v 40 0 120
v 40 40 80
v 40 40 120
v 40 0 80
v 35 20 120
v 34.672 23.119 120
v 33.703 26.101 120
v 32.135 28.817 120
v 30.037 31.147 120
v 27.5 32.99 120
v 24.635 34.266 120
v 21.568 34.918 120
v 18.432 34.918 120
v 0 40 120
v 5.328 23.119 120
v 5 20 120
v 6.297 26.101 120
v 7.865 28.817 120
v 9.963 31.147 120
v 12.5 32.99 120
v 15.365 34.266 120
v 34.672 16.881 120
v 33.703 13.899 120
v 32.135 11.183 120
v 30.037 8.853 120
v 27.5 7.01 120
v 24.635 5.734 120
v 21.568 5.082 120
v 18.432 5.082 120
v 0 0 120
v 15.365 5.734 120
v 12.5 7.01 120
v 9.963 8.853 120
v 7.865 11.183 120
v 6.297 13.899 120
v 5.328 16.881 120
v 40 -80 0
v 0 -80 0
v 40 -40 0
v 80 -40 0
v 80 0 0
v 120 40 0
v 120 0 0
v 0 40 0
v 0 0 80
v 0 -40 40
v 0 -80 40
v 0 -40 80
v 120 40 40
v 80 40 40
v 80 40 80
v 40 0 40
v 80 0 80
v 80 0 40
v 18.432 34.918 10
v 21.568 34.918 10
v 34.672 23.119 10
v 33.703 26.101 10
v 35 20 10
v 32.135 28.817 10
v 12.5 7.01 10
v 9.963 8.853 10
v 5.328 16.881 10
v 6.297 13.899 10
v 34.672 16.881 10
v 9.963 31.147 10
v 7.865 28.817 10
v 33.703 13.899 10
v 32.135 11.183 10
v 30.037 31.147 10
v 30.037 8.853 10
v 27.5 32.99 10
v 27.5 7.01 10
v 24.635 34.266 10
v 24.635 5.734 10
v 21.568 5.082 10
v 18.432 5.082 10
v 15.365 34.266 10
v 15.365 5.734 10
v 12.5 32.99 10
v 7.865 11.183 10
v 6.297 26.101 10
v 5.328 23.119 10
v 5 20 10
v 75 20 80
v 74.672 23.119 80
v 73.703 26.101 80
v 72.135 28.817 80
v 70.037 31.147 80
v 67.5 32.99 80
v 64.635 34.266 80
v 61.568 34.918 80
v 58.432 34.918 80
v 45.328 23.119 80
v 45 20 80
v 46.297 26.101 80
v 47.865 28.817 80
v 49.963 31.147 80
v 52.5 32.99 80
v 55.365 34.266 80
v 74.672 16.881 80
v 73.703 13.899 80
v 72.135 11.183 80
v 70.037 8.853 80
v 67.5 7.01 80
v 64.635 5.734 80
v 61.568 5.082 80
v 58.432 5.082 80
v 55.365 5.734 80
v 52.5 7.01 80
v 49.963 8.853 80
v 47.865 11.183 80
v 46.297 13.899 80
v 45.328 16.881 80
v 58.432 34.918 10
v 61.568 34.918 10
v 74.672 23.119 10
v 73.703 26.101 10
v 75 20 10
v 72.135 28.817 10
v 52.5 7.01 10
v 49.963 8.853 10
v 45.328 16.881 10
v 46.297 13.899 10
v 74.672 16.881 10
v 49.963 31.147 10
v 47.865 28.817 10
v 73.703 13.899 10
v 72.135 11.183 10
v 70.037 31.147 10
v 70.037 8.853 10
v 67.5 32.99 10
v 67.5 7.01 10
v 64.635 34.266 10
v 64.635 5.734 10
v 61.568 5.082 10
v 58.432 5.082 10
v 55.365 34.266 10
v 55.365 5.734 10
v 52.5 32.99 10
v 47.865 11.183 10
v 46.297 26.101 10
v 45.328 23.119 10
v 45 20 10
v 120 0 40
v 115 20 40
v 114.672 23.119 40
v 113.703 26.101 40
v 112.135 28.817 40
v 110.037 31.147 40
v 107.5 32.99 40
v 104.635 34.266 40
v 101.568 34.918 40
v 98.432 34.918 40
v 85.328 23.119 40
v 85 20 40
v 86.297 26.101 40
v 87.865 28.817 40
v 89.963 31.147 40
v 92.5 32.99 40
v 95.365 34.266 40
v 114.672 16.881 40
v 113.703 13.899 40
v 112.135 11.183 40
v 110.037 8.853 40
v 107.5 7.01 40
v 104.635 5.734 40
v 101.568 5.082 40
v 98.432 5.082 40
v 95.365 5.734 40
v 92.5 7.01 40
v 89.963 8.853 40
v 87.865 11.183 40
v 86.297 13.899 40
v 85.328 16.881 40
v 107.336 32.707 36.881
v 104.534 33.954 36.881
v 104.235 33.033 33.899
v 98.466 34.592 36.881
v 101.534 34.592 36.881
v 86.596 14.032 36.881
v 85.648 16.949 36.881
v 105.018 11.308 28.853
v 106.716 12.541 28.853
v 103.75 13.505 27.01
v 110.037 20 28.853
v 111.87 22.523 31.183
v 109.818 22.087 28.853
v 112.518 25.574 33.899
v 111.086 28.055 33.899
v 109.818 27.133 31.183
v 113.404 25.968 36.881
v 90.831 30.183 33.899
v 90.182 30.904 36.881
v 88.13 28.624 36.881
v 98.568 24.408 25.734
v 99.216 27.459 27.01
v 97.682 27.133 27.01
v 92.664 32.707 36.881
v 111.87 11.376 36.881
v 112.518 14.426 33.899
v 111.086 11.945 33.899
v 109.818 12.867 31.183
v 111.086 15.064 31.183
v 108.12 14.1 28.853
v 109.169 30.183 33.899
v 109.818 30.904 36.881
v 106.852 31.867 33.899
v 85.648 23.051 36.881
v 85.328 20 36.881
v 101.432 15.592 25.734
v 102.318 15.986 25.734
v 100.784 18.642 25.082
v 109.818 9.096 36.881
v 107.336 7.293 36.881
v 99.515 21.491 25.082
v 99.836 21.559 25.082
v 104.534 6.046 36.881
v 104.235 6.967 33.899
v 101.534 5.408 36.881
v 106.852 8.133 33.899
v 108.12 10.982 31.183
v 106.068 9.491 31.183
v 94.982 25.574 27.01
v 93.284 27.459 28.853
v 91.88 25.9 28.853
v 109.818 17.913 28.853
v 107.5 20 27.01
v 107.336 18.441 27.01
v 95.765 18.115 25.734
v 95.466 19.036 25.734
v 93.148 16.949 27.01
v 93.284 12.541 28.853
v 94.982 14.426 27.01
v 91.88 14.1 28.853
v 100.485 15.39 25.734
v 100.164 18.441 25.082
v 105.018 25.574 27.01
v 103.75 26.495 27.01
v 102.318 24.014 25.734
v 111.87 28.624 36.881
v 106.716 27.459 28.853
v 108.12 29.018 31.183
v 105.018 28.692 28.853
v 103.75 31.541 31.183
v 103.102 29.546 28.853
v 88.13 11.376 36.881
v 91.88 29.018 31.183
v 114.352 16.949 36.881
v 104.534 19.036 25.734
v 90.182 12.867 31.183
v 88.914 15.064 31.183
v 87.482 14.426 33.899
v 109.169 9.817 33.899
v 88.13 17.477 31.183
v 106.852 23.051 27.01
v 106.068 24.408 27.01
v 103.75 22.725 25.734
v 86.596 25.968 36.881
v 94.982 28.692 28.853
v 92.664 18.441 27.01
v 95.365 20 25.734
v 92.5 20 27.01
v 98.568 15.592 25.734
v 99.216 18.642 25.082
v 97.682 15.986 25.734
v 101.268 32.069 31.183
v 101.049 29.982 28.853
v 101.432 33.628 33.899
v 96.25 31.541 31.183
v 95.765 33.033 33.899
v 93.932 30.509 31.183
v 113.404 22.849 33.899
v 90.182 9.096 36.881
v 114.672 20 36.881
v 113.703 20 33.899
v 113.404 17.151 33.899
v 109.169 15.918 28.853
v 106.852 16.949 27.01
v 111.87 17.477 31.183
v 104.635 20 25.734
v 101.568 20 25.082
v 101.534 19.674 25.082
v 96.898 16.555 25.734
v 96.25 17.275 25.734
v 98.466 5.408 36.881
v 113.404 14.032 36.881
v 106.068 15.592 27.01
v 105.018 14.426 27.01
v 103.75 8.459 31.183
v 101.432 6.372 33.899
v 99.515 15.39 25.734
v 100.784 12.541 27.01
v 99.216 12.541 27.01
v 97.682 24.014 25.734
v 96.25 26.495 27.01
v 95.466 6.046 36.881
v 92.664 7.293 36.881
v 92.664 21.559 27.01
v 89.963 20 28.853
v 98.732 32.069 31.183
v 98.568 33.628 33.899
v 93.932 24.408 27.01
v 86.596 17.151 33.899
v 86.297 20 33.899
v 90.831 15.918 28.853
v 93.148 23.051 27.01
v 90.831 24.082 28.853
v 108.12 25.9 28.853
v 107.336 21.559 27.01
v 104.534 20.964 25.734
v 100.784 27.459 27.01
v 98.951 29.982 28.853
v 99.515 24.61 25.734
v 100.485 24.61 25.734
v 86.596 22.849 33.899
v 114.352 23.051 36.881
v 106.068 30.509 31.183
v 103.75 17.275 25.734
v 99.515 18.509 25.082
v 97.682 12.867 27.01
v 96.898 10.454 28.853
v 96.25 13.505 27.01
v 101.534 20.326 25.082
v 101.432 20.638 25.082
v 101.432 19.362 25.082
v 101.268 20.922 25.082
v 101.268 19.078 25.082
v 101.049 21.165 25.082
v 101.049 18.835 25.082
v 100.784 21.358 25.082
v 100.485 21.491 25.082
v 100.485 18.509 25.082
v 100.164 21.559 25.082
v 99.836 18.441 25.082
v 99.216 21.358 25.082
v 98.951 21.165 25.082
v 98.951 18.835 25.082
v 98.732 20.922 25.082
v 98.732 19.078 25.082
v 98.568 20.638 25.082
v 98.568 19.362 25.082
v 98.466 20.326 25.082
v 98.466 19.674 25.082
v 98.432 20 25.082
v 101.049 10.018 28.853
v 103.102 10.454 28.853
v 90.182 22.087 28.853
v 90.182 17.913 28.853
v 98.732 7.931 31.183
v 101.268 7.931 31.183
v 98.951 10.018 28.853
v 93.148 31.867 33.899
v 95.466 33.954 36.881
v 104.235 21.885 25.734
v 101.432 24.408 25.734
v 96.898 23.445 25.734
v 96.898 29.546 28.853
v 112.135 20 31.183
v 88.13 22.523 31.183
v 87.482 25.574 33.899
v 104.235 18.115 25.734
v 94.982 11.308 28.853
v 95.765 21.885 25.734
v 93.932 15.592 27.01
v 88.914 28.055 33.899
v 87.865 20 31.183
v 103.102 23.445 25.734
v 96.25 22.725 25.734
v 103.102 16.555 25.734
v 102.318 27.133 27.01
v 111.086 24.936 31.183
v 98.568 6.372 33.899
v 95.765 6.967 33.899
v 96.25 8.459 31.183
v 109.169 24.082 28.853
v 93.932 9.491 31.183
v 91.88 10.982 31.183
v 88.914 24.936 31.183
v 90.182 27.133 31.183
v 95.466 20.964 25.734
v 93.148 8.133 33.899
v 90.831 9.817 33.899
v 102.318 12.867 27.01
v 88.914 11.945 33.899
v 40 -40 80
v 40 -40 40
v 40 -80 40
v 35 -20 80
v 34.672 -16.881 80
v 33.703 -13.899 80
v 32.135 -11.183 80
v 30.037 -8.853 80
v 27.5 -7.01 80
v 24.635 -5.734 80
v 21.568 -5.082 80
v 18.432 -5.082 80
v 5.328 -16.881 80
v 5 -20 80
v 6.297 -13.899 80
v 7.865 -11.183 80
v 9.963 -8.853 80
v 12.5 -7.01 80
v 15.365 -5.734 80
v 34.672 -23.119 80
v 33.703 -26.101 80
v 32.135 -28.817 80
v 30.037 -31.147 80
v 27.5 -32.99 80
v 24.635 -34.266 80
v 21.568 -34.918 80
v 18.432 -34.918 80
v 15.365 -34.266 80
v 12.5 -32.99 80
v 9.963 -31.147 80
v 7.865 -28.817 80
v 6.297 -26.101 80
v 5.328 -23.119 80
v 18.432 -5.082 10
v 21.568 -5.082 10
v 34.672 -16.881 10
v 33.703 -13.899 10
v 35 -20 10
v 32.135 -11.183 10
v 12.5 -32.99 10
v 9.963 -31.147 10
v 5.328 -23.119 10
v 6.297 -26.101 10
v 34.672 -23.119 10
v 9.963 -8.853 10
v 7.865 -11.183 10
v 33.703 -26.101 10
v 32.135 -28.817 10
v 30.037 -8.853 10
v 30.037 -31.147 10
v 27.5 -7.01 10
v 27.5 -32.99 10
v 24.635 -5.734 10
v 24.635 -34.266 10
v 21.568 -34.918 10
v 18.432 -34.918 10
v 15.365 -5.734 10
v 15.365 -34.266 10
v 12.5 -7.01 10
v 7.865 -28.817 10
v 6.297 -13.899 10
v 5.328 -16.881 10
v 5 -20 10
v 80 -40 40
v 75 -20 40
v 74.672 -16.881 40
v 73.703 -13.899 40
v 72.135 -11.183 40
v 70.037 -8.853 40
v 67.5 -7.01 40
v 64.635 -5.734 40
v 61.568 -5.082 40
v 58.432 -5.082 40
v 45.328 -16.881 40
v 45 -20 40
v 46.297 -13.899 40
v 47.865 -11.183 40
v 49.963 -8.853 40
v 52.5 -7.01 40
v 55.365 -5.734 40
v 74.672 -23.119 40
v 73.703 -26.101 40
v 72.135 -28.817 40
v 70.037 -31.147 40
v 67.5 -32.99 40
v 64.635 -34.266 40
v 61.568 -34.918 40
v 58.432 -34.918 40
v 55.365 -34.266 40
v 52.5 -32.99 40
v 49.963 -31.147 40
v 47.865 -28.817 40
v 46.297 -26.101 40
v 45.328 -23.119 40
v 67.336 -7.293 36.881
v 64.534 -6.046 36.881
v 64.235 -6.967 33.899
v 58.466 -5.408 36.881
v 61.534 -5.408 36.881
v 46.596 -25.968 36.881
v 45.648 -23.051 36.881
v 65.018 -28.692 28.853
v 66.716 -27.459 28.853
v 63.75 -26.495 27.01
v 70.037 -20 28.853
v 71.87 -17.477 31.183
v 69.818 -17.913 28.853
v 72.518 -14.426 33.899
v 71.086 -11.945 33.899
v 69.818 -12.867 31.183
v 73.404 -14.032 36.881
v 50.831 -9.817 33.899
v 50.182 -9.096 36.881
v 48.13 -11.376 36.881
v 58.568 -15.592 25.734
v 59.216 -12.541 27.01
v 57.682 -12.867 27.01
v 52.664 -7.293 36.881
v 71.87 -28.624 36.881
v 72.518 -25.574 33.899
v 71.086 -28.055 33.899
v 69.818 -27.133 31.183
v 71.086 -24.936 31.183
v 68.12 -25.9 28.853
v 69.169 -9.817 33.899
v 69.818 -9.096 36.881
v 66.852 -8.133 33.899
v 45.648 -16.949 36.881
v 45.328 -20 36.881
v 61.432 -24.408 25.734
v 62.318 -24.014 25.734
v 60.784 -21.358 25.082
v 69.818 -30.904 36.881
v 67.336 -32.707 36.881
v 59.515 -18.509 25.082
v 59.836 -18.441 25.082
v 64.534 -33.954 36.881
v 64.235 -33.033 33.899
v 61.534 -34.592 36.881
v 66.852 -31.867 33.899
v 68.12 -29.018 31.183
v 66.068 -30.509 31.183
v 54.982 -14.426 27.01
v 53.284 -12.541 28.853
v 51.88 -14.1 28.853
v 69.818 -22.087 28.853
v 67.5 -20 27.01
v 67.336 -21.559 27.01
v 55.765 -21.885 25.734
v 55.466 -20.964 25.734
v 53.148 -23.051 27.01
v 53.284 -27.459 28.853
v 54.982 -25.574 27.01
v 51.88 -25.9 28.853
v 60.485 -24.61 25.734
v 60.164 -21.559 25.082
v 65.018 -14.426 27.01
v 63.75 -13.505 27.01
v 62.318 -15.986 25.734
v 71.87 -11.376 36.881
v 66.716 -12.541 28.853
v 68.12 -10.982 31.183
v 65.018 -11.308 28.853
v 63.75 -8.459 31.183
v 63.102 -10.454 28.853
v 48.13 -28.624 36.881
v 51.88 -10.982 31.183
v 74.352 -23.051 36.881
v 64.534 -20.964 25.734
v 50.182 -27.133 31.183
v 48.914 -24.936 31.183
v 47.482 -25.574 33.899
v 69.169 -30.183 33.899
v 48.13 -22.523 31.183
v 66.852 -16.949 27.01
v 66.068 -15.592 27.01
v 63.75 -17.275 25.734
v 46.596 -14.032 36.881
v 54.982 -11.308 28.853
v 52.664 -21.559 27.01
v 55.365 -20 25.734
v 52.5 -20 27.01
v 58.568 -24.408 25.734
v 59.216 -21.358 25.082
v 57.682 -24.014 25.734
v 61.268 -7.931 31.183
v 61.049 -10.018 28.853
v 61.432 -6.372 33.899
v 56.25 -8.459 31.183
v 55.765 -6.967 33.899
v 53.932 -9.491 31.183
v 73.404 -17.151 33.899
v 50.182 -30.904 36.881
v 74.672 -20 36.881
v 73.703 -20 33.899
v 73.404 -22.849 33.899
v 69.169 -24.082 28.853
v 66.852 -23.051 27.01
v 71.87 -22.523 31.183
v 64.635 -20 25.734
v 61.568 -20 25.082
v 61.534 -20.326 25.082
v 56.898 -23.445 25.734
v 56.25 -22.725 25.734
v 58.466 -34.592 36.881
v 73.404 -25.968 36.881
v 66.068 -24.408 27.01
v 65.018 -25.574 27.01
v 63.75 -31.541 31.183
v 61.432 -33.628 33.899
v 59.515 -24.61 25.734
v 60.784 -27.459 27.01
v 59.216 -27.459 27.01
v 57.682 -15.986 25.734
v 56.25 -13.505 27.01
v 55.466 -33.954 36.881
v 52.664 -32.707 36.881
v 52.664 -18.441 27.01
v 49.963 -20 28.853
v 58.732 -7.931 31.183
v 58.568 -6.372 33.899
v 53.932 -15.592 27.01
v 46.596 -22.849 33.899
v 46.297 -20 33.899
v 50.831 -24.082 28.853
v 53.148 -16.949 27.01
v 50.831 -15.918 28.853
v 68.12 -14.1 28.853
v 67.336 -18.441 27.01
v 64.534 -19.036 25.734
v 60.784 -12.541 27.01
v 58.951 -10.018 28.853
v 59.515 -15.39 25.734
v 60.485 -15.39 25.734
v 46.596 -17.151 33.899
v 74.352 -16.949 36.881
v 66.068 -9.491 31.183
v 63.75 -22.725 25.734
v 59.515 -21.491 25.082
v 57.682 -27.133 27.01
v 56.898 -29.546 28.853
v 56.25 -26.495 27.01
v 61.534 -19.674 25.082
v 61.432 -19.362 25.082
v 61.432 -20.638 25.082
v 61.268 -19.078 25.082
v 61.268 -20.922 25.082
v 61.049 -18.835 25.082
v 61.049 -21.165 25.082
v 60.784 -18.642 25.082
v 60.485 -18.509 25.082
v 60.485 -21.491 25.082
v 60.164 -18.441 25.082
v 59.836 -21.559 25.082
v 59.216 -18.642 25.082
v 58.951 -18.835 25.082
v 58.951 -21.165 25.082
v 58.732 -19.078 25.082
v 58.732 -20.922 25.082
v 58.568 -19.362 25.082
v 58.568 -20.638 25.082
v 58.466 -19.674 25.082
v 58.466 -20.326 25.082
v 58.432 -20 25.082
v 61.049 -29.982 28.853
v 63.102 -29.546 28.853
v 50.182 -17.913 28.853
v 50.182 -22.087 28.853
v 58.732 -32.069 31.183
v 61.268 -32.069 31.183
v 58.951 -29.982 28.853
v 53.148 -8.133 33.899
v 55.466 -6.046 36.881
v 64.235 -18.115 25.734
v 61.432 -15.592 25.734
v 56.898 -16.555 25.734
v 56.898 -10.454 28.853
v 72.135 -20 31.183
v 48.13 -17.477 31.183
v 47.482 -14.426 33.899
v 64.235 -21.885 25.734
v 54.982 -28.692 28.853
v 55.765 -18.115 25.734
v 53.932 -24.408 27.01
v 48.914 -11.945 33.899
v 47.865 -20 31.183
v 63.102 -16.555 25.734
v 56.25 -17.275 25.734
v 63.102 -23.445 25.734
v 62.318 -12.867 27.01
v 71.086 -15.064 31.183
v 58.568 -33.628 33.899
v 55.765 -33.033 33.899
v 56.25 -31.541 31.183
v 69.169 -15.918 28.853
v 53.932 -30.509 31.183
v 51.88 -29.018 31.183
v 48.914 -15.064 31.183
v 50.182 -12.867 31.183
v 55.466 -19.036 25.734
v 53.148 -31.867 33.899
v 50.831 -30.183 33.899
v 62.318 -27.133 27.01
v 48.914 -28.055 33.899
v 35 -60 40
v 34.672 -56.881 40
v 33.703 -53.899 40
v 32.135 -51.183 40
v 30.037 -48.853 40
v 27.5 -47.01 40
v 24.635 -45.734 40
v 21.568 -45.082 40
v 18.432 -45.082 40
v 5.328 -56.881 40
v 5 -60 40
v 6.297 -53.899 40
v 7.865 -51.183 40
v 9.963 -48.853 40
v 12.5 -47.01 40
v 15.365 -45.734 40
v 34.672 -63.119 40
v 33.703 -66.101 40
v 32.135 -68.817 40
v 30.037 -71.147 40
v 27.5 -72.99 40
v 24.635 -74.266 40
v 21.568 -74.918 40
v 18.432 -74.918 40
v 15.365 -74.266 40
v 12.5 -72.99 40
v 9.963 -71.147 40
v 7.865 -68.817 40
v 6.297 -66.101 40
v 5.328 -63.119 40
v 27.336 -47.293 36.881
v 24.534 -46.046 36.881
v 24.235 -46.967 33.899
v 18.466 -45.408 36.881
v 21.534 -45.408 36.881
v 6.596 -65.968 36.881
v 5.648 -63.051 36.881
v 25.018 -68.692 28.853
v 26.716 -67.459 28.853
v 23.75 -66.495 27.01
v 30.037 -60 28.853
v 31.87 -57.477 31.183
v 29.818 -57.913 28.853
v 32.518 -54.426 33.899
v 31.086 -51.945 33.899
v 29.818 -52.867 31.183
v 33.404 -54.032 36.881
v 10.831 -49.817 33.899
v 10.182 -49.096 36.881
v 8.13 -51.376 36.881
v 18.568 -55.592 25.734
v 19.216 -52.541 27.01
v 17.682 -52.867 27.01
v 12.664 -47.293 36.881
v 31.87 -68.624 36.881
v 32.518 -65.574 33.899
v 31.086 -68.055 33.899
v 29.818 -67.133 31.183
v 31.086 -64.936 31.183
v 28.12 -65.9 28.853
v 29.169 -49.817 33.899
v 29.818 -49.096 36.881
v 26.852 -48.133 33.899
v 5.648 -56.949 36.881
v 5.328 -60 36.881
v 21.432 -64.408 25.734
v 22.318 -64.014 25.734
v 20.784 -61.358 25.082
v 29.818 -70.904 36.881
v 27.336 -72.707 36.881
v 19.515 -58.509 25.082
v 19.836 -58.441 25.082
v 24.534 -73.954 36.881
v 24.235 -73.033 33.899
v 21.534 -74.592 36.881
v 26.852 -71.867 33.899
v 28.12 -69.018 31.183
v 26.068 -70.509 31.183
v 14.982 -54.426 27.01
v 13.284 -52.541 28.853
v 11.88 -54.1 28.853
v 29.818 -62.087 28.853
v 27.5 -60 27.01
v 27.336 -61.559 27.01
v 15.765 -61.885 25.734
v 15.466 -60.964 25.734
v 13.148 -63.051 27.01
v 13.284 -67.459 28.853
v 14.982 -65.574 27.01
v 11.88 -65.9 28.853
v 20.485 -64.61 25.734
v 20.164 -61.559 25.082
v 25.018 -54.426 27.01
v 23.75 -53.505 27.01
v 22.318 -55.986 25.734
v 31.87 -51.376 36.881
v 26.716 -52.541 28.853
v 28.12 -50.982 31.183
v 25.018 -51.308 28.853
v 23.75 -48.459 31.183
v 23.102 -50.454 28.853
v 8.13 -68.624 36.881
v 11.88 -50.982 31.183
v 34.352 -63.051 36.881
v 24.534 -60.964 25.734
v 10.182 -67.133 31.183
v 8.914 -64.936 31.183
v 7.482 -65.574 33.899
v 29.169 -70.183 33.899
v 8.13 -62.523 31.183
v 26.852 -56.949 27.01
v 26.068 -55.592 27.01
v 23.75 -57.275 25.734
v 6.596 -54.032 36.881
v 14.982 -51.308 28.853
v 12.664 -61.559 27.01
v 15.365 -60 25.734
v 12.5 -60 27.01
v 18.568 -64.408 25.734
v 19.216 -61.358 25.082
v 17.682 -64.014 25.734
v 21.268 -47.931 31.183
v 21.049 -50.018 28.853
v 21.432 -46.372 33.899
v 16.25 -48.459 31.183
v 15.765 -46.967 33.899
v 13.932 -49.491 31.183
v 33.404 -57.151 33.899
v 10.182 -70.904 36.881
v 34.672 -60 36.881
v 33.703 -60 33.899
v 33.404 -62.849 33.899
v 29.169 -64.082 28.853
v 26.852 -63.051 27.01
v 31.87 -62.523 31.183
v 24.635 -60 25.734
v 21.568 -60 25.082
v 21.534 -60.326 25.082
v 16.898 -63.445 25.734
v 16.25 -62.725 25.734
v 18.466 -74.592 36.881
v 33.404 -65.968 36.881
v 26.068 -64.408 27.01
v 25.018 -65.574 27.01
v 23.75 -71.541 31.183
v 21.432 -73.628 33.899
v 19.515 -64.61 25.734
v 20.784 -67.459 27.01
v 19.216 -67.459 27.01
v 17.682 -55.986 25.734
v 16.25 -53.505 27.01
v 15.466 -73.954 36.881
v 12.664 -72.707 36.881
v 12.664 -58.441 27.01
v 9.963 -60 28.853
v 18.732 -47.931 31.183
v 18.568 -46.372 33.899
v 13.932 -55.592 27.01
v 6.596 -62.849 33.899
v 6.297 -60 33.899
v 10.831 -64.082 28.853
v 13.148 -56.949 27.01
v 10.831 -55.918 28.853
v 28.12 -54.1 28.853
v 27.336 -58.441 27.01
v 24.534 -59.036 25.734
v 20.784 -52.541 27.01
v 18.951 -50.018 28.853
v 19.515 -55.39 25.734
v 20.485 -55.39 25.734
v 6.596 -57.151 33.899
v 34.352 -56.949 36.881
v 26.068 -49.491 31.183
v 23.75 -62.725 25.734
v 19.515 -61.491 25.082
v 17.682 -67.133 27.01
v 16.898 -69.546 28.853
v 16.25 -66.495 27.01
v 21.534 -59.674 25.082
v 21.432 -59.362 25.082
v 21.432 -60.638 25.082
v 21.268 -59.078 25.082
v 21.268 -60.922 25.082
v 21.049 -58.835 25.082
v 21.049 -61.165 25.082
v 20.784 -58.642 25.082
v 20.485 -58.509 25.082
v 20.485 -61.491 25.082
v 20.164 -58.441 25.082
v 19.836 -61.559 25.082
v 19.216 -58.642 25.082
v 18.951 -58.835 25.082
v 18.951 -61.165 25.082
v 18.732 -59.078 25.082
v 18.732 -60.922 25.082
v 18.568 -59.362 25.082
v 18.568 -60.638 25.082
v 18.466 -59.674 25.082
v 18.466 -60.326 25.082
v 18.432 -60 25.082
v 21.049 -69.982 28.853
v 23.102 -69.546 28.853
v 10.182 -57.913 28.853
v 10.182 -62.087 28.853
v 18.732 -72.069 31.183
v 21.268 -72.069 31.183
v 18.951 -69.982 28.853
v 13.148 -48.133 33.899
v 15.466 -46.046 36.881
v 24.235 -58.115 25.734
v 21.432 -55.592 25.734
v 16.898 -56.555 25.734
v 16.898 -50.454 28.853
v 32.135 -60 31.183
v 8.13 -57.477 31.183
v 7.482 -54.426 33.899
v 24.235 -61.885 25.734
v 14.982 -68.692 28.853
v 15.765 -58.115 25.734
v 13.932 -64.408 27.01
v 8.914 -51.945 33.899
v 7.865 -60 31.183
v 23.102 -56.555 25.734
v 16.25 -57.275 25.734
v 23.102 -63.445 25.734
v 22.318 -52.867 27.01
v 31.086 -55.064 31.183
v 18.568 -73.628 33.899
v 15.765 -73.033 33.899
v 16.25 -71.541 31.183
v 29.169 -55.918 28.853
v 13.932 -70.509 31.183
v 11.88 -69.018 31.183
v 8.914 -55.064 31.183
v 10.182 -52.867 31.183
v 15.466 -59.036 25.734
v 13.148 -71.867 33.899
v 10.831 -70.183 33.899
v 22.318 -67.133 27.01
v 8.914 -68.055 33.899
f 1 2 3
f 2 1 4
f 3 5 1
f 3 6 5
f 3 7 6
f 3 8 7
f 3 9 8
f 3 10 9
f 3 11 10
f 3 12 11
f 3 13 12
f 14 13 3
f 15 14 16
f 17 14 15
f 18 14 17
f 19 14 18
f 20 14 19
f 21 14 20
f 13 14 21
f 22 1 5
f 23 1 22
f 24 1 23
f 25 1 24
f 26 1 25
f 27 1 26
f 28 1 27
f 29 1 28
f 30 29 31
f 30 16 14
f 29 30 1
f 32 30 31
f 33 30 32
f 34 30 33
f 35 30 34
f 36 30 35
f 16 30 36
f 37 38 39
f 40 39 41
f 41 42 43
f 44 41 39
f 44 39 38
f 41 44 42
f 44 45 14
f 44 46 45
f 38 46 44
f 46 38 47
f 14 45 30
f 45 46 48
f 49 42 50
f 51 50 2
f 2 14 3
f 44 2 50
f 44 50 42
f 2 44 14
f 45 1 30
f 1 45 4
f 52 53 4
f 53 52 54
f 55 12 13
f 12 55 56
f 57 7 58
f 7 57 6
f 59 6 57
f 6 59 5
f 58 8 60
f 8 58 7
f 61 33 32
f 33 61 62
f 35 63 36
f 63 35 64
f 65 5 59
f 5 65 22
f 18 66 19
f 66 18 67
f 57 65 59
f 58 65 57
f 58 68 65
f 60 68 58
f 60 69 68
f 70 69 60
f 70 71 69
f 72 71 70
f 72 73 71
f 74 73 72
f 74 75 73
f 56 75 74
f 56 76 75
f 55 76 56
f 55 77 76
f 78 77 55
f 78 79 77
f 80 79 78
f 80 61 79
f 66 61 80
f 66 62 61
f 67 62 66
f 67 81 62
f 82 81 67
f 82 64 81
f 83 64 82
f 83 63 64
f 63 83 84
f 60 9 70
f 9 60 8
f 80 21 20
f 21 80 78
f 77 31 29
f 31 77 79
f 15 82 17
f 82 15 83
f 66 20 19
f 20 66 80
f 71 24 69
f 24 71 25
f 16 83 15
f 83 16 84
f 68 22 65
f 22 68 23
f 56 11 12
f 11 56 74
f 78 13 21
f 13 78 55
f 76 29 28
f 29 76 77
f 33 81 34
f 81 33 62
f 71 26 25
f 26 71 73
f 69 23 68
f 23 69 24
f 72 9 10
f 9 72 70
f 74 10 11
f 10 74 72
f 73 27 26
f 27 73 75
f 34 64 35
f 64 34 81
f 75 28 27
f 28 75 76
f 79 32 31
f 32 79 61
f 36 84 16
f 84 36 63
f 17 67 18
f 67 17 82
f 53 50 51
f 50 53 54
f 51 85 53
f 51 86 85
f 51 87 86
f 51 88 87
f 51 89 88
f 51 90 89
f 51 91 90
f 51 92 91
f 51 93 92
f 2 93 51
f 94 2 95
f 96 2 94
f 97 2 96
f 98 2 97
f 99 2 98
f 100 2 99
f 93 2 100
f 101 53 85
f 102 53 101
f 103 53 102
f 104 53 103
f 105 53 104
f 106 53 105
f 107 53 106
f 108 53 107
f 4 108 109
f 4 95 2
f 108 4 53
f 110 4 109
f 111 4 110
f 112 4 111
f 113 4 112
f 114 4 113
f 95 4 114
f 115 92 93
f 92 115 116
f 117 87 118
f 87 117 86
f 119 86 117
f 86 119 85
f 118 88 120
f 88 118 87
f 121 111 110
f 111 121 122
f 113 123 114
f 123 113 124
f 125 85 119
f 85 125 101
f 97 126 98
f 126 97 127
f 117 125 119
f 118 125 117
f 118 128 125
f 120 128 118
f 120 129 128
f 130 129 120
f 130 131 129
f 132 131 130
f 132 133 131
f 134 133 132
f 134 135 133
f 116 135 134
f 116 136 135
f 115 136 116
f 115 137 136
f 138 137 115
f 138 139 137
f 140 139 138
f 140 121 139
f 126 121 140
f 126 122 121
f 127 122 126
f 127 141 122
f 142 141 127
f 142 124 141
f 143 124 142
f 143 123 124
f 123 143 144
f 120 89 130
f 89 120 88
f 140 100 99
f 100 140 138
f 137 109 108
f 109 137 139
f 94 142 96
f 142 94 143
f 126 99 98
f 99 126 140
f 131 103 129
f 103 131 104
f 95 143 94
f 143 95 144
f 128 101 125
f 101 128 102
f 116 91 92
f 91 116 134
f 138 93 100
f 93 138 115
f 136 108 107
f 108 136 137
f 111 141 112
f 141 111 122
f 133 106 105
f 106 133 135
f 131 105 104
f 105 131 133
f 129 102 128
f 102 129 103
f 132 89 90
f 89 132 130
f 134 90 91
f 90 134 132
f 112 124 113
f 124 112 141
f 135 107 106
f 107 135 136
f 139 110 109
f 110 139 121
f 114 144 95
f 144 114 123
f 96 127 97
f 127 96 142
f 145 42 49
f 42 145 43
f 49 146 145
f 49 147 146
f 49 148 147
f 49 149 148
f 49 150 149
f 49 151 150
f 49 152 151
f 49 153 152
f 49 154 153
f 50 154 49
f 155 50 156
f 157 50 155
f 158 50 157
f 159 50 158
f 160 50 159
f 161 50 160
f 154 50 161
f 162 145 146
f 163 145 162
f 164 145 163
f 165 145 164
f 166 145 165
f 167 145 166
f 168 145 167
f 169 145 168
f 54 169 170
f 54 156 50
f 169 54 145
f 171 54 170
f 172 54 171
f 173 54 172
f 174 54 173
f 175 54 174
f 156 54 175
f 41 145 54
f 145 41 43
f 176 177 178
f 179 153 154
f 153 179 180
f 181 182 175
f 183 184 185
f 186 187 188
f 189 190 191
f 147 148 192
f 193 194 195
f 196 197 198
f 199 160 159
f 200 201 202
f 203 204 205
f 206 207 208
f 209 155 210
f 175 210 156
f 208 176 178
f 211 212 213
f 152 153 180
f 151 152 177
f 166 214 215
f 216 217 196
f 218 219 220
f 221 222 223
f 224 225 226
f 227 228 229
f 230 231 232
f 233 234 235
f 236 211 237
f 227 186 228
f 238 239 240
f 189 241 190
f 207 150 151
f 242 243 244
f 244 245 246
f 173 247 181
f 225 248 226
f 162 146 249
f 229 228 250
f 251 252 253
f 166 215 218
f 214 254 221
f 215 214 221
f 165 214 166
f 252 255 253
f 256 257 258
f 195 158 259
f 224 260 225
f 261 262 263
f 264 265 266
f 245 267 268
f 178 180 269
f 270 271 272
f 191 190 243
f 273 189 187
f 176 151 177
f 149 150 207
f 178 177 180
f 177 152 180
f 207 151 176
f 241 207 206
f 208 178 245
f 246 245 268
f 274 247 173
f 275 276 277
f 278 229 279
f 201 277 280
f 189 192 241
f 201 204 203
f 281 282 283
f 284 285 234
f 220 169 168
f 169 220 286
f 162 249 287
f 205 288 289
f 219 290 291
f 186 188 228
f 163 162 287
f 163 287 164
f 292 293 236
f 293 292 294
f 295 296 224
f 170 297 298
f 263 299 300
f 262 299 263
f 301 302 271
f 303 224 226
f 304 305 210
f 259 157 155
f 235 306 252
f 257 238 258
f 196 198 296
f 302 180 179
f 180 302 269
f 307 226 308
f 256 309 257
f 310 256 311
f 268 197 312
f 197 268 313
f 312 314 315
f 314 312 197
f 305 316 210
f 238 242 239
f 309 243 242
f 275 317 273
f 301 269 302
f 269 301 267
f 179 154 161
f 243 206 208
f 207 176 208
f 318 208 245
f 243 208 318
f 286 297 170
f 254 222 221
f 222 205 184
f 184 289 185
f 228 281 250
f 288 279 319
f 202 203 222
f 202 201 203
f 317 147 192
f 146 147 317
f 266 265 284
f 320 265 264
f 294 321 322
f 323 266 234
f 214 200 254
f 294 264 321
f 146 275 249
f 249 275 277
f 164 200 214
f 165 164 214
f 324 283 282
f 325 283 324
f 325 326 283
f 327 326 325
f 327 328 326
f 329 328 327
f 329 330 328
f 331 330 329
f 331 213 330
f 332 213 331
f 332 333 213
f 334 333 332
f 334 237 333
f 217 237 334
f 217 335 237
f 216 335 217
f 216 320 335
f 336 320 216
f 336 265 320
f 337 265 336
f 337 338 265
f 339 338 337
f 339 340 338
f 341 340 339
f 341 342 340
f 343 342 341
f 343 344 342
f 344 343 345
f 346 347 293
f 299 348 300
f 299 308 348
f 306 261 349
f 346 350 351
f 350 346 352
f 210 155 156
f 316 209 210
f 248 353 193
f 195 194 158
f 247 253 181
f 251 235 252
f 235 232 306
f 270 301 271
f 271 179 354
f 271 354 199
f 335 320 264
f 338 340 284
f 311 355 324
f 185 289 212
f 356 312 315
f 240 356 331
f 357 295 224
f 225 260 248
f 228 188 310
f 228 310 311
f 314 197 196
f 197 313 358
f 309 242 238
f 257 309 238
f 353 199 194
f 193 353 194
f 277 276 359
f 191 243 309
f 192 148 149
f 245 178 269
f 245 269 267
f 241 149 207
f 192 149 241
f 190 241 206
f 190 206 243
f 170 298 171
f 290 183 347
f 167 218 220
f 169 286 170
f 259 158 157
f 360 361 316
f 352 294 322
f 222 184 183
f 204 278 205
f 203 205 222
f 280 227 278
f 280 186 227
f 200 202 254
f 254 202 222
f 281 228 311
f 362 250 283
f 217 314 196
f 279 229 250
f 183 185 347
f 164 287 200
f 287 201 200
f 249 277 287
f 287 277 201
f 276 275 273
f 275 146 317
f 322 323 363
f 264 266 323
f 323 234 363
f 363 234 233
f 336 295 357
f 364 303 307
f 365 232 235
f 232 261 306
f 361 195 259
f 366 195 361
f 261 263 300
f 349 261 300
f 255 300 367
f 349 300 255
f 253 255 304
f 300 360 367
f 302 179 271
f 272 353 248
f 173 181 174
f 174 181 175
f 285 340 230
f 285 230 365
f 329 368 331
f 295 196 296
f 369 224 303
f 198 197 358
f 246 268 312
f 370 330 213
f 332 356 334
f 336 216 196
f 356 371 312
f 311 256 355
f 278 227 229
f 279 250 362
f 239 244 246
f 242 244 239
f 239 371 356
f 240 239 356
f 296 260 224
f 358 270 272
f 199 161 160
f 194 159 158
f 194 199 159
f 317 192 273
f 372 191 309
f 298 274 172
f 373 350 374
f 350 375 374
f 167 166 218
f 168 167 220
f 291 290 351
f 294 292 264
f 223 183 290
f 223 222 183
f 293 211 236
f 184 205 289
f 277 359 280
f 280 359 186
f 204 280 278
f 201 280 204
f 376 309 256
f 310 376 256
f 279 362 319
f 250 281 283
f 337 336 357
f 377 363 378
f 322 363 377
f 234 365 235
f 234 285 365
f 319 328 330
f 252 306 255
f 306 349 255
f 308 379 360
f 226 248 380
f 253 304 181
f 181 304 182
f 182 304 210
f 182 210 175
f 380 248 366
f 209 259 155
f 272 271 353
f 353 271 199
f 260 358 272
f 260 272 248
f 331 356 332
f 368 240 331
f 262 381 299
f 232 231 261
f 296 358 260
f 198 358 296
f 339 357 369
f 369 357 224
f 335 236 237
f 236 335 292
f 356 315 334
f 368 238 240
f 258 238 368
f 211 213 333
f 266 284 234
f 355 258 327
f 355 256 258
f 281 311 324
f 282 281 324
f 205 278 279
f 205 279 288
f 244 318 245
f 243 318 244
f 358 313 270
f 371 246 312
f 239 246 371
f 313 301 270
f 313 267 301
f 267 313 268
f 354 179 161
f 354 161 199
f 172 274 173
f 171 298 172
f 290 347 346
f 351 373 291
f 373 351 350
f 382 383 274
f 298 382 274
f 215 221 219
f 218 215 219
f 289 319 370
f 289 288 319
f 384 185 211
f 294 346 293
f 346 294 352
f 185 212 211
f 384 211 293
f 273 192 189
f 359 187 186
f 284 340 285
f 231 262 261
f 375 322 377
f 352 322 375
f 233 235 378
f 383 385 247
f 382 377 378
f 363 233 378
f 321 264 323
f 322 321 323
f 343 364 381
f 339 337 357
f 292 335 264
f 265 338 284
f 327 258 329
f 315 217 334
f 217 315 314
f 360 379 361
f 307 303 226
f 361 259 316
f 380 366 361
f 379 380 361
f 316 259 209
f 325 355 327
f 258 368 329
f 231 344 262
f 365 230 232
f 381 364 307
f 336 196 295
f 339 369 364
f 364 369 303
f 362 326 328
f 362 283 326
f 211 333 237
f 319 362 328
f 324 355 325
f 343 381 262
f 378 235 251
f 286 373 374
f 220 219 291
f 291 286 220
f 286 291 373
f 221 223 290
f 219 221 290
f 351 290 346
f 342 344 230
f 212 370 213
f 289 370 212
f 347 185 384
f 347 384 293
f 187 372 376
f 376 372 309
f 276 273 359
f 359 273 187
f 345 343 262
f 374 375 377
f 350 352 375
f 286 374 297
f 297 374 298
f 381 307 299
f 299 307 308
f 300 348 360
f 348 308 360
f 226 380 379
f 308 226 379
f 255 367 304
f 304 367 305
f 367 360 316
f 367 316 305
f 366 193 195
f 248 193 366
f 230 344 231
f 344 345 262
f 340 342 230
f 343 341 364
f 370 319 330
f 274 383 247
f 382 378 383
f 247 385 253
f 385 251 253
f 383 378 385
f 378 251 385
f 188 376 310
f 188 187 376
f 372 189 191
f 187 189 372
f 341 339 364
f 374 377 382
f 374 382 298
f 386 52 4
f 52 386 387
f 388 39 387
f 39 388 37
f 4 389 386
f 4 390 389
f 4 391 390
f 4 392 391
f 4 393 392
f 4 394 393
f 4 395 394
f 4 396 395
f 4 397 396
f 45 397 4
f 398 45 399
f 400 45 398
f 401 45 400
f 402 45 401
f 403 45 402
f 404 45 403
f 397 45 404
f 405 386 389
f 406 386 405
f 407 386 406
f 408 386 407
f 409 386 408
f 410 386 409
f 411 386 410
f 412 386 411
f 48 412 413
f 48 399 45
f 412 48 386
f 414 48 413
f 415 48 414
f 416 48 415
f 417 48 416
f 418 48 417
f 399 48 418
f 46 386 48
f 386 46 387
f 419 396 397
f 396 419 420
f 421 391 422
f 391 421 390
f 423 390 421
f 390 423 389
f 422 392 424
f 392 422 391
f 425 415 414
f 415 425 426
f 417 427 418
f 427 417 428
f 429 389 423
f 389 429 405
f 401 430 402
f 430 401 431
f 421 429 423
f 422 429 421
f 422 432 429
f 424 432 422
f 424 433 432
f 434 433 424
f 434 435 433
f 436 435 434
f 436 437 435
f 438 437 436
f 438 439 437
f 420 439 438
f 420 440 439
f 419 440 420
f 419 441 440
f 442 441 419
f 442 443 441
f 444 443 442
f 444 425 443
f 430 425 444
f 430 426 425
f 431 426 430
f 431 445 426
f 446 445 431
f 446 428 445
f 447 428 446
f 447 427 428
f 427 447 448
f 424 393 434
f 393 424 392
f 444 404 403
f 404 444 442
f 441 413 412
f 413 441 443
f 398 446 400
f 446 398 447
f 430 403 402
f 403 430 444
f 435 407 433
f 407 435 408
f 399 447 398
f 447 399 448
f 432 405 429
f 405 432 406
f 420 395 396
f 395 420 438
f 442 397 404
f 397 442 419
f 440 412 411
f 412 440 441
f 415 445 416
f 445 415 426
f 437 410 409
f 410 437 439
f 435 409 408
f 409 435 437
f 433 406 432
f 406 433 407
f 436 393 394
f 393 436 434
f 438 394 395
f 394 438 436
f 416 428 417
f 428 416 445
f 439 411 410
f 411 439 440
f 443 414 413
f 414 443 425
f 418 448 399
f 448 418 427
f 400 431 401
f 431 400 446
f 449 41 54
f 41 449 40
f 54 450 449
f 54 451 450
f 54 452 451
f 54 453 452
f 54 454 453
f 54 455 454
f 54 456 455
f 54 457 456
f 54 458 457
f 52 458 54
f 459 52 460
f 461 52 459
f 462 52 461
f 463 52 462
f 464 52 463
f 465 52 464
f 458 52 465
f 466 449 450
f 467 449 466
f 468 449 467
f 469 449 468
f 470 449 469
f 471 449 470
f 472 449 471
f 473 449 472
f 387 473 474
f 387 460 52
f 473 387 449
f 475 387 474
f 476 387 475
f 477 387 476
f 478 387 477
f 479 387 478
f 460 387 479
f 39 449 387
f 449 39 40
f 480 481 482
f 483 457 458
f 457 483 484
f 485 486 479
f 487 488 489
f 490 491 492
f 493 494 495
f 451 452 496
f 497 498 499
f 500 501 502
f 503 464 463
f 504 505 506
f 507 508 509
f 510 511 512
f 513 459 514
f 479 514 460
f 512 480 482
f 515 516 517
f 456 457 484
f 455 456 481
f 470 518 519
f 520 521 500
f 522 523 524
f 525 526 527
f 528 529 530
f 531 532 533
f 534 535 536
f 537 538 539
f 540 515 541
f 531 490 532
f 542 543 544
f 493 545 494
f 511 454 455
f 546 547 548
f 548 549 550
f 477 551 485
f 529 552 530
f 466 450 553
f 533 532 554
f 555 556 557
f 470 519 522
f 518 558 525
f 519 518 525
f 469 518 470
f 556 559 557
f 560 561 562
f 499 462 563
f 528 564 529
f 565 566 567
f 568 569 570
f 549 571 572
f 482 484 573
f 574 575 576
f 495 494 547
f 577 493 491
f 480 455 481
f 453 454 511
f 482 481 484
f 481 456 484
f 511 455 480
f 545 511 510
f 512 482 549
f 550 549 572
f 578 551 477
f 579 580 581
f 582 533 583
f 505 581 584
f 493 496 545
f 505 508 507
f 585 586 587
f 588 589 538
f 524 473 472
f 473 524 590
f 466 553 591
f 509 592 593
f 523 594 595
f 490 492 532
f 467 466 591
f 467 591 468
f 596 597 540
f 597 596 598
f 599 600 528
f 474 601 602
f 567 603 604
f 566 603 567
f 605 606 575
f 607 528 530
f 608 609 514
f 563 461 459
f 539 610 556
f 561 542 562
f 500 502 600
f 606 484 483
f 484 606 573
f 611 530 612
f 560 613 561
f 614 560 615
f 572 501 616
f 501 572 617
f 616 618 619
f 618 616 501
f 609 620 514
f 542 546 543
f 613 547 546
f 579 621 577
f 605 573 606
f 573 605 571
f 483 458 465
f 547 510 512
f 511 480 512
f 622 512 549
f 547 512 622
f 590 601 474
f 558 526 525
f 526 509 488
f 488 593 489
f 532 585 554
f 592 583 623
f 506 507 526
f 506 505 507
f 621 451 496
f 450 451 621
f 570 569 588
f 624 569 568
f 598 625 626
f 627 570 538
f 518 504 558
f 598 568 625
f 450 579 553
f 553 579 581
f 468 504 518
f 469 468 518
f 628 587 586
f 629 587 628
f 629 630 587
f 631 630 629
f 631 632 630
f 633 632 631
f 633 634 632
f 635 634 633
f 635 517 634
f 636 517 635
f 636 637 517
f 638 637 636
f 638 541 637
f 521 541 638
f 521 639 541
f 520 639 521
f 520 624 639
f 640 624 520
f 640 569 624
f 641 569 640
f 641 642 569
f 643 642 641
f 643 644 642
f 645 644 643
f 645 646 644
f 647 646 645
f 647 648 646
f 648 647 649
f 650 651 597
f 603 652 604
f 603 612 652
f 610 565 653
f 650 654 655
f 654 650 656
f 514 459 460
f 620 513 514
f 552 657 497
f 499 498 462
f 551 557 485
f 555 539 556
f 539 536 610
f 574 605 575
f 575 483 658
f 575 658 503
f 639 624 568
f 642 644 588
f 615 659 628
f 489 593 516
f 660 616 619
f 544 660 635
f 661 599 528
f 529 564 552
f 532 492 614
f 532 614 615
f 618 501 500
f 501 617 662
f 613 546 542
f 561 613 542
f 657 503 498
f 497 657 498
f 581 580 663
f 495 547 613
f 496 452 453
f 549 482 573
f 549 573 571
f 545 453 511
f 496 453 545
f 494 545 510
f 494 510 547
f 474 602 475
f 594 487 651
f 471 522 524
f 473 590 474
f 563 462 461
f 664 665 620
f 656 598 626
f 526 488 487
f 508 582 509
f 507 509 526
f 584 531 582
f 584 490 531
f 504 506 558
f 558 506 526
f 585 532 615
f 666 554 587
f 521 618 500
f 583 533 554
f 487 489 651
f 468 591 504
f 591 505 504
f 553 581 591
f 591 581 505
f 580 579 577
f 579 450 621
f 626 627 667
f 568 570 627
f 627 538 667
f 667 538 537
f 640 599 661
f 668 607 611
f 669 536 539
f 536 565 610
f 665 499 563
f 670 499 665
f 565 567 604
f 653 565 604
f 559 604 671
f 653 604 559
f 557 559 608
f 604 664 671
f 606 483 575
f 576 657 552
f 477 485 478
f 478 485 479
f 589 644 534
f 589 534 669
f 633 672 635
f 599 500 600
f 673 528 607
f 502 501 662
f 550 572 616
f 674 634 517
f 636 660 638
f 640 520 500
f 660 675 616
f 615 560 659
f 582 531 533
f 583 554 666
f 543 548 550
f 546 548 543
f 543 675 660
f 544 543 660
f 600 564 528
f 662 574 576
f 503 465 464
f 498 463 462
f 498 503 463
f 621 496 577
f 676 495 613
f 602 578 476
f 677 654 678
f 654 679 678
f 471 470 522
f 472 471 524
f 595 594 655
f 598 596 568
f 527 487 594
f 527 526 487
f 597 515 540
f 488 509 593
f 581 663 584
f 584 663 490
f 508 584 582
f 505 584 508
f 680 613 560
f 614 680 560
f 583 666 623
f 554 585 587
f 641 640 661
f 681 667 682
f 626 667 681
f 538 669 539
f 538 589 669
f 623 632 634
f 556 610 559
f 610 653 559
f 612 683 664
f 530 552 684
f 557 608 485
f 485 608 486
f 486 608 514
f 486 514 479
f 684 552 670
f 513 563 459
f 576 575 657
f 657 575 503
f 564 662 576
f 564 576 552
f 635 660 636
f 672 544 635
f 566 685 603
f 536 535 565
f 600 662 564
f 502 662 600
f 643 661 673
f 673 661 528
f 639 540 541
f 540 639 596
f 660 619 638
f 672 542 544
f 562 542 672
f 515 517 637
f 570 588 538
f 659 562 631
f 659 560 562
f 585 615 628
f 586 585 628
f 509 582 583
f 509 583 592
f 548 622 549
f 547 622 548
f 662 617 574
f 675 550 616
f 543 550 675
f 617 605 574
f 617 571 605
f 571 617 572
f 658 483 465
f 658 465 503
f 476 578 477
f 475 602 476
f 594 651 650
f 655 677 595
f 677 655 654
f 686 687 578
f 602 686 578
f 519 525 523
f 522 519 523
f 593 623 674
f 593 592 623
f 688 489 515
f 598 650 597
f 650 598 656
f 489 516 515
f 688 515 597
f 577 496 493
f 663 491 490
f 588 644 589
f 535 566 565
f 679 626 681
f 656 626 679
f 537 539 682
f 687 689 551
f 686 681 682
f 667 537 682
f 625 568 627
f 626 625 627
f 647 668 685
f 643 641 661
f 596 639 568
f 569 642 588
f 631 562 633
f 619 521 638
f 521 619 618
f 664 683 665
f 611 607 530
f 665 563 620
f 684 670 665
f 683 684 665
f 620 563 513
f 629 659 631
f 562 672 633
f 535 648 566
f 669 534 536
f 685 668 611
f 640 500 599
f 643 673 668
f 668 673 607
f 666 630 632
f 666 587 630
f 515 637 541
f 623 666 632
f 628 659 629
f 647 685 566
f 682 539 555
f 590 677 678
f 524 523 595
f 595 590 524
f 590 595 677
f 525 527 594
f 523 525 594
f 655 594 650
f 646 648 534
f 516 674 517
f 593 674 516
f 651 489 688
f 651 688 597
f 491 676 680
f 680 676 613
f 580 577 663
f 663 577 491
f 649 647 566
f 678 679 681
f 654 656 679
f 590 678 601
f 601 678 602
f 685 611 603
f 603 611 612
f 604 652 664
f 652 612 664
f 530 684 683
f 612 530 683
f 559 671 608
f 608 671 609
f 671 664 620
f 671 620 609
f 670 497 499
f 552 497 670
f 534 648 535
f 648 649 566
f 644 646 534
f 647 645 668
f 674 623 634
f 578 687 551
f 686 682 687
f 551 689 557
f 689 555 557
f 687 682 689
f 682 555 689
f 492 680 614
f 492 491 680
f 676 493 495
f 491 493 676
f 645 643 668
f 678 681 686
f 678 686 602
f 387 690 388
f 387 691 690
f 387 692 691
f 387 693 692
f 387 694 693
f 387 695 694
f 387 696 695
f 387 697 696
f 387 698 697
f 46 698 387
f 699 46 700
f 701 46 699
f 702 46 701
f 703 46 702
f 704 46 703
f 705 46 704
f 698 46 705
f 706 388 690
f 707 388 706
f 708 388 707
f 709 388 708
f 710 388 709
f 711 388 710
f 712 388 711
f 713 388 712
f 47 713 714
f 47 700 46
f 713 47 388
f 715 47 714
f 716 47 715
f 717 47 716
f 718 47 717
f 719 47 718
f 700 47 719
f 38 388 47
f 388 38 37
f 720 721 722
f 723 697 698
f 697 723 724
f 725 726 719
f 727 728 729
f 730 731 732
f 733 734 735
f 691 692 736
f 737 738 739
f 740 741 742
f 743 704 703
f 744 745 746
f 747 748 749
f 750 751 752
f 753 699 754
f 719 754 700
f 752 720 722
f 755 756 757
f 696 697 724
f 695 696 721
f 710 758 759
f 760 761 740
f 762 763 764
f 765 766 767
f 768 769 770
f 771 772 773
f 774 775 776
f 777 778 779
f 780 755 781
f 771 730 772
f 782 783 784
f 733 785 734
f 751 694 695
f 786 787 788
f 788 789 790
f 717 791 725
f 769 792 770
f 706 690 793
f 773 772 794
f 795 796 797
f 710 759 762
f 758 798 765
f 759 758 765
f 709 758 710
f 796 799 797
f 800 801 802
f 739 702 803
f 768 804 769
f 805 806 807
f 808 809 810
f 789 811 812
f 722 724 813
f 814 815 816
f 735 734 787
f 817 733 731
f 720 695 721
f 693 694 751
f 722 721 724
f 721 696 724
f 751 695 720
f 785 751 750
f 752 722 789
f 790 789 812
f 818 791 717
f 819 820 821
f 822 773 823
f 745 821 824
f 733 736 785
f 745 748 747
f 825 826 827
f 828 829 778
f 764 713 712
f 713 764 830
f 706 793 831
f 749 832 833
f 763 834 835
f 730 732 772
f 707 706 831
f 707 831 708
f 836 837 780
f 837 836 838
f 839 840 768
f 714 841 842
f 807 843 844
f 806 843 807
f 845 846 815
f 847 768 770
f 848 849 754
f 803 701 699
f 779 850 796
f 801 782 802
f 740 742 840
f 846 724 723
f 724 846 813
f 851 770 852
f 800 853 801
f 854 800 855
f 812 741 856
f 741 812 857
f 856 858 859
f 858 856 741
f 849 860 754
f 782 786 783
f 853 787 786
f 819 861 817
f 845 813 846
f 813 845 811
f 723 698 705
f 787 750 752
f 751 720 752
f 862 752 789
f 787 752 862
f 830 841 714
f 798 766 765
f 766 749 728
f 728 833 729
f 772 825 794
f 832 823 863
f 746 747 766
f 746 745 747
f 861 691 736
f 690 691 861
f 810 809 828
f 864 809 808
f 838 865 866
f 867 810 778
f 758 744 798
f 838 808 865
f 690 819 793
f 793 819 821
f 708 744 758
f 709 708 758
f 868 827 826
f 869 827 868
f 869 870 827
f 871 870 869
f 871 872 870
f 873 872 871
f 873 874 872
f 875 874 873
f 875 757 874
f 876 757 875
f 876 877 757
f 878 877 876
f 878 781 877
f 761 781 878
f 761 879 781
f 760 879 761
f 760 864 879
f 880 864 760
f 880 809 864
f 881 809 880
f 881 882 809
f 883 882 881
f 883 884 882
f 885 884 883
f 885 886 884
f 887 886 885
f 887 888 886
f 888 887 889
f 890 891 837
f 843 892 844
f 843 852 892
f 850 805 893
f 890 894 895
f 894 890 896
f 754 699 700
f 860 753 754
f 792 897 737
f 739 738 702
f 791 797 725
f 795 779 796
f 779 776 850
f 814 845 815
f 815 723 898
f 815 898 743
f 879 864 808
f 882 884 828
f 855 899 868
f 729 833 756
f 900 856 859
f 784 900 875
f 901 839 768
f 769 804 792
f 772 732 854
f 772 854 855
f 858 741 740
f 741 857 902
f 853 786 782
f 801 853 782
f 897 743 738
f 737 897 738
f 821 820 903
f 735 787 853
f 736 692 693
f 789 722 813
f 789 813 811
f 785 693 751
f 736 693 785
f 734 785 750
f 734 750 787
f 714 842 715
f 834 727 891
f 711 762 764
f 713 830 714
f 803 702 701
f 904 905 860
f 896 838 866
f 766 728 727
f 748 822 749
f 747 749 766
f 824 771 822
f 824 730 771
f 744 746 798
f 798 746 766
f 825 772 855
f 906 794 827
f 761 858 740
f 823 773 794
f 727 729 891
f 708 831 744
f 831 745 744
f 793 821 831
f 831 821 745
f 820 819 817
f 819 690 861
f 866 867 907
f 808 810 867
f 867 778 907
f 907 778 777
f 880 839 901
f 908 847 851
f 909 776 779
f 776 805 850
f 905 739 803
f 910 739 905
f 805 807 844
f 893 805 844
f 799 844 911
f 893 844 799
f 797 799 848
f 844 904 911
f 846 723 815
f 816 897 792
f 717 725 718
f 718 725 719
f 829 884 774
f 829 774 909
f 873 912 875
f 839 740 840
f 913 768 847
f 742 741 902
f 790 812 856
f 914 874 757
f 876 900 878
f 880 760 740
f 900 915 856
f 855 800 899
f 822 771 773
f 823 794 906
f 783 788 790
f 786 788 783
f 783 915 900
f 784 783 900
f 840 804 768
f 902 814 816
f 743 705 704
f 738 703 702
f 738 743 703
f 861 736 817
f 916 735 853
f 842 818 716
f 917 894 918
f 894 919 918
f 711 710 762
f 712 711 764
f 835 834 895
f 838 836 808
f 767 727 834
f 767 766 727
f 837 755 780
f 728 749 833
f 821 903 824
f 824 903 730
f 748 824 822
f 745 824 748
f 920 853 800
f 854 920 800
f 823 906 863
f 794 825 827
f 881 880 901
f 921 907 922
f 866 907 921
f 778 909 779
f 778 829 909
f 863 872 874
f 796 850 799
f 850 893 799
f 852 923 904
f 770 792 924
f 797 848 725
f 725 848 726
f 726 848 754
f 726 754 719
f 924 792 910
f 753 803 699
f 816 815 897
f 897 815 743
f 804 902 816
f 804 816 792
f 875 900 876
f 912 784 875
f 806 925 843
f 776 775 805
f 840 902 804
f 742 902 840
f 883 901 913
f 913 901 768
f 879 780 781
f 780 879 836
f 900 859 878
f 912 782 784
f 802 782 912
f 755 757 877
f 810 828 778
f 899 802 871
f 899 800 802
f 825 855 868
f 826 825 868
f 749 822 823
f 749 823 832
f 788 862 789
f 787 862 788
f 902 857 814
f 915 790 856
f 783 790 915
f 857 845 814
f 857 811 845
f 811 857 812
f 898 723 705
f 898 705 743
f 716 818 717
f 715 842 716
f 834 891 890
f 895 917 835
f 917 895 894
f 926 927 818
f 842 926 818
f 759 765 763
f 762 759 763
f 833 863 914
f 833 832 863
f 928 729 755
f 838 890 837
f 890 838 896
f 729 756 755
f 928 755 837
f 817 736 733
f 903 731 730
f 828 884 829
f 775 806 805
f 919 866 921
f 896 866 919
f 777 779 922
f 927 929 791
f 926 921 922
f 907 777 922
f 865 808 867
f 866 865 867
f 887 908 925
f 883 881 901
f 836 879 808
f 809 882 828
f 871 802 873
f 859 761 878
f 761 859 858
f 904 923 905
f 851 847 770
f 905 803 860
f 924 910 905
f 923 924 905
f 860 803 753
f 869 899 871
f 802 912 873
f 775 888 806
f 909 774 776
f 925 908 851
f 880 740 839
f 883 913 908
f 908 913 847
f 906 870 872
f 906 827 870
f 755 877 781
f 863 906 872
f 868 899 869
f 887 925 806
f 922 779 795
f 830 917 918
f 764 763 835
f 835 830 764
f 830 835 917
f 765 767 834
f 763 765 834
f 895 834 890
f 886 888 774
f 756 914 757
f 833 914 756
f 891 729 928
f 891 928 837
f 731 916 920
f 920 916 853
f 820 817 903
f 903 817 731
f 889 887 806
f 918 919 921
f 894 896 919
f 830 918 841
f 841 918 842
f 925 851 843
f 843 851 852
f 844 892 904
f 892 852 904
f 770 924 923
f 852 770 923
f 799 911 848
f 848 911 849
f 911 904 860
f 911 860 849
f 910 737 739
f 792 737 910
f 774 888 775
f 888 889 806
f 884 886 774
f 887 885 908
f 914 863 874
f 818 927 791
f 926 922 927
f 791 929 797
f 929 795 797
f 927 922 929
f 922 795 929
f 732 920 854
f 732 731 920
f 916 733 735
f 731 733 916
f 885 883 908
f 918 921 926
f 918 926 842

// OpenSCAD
/**
 * Design for a bookend, with holes for airplants, pencils, etc.
 *
 * Parameters:
 *  - height: The total height.
 *  - width: The width of each block.
 *  - padding: The padding between the holes and the edge.
 */

height = 120;
width = 40;
padding = 10;

module col(h, sph=false) {
    difference() {
        cube([width, width, h]);
        if (sph)
            translate([width / 2, width / 2, h])
                sphere(d=width - padding);
        else
            translate([width / 2, width / 2, padding])
                cylinder(h, d=width - padding);
    }
}

module strut(h) {
    translate([width / 2, 0, 0])
        difference() {
            polyhedron(
                points=[
                    [width / 2, -width, 0],
                    [width / 2, 0, 0],
                    [-width / 2, 0, 0],
                    [-width / 2, -width, 0],
                    [0, 0, -width],
                ],
                faces=[
                    [0,1,4],
                    [1,2,4],
                    [2,3,4],
                    [3,0,4],
                    [1,0,3],
                    [2,1,3],
                ]
            );
            translate([0, -width / 2, 0])
                sphere(d=width - padding);
        }
}


col(height);
translate([width, 0, 0])
    col(2 * height / 3);
translate([width * 2, 0, 0])
    col(height / 3, true);
translate([0, -width, 0])
    col(2 * height / 3);
translate([width, -width, 0])
    col(height / 3, true);
translate([0, -2 * width, 0])
    col(height / 3, true);
